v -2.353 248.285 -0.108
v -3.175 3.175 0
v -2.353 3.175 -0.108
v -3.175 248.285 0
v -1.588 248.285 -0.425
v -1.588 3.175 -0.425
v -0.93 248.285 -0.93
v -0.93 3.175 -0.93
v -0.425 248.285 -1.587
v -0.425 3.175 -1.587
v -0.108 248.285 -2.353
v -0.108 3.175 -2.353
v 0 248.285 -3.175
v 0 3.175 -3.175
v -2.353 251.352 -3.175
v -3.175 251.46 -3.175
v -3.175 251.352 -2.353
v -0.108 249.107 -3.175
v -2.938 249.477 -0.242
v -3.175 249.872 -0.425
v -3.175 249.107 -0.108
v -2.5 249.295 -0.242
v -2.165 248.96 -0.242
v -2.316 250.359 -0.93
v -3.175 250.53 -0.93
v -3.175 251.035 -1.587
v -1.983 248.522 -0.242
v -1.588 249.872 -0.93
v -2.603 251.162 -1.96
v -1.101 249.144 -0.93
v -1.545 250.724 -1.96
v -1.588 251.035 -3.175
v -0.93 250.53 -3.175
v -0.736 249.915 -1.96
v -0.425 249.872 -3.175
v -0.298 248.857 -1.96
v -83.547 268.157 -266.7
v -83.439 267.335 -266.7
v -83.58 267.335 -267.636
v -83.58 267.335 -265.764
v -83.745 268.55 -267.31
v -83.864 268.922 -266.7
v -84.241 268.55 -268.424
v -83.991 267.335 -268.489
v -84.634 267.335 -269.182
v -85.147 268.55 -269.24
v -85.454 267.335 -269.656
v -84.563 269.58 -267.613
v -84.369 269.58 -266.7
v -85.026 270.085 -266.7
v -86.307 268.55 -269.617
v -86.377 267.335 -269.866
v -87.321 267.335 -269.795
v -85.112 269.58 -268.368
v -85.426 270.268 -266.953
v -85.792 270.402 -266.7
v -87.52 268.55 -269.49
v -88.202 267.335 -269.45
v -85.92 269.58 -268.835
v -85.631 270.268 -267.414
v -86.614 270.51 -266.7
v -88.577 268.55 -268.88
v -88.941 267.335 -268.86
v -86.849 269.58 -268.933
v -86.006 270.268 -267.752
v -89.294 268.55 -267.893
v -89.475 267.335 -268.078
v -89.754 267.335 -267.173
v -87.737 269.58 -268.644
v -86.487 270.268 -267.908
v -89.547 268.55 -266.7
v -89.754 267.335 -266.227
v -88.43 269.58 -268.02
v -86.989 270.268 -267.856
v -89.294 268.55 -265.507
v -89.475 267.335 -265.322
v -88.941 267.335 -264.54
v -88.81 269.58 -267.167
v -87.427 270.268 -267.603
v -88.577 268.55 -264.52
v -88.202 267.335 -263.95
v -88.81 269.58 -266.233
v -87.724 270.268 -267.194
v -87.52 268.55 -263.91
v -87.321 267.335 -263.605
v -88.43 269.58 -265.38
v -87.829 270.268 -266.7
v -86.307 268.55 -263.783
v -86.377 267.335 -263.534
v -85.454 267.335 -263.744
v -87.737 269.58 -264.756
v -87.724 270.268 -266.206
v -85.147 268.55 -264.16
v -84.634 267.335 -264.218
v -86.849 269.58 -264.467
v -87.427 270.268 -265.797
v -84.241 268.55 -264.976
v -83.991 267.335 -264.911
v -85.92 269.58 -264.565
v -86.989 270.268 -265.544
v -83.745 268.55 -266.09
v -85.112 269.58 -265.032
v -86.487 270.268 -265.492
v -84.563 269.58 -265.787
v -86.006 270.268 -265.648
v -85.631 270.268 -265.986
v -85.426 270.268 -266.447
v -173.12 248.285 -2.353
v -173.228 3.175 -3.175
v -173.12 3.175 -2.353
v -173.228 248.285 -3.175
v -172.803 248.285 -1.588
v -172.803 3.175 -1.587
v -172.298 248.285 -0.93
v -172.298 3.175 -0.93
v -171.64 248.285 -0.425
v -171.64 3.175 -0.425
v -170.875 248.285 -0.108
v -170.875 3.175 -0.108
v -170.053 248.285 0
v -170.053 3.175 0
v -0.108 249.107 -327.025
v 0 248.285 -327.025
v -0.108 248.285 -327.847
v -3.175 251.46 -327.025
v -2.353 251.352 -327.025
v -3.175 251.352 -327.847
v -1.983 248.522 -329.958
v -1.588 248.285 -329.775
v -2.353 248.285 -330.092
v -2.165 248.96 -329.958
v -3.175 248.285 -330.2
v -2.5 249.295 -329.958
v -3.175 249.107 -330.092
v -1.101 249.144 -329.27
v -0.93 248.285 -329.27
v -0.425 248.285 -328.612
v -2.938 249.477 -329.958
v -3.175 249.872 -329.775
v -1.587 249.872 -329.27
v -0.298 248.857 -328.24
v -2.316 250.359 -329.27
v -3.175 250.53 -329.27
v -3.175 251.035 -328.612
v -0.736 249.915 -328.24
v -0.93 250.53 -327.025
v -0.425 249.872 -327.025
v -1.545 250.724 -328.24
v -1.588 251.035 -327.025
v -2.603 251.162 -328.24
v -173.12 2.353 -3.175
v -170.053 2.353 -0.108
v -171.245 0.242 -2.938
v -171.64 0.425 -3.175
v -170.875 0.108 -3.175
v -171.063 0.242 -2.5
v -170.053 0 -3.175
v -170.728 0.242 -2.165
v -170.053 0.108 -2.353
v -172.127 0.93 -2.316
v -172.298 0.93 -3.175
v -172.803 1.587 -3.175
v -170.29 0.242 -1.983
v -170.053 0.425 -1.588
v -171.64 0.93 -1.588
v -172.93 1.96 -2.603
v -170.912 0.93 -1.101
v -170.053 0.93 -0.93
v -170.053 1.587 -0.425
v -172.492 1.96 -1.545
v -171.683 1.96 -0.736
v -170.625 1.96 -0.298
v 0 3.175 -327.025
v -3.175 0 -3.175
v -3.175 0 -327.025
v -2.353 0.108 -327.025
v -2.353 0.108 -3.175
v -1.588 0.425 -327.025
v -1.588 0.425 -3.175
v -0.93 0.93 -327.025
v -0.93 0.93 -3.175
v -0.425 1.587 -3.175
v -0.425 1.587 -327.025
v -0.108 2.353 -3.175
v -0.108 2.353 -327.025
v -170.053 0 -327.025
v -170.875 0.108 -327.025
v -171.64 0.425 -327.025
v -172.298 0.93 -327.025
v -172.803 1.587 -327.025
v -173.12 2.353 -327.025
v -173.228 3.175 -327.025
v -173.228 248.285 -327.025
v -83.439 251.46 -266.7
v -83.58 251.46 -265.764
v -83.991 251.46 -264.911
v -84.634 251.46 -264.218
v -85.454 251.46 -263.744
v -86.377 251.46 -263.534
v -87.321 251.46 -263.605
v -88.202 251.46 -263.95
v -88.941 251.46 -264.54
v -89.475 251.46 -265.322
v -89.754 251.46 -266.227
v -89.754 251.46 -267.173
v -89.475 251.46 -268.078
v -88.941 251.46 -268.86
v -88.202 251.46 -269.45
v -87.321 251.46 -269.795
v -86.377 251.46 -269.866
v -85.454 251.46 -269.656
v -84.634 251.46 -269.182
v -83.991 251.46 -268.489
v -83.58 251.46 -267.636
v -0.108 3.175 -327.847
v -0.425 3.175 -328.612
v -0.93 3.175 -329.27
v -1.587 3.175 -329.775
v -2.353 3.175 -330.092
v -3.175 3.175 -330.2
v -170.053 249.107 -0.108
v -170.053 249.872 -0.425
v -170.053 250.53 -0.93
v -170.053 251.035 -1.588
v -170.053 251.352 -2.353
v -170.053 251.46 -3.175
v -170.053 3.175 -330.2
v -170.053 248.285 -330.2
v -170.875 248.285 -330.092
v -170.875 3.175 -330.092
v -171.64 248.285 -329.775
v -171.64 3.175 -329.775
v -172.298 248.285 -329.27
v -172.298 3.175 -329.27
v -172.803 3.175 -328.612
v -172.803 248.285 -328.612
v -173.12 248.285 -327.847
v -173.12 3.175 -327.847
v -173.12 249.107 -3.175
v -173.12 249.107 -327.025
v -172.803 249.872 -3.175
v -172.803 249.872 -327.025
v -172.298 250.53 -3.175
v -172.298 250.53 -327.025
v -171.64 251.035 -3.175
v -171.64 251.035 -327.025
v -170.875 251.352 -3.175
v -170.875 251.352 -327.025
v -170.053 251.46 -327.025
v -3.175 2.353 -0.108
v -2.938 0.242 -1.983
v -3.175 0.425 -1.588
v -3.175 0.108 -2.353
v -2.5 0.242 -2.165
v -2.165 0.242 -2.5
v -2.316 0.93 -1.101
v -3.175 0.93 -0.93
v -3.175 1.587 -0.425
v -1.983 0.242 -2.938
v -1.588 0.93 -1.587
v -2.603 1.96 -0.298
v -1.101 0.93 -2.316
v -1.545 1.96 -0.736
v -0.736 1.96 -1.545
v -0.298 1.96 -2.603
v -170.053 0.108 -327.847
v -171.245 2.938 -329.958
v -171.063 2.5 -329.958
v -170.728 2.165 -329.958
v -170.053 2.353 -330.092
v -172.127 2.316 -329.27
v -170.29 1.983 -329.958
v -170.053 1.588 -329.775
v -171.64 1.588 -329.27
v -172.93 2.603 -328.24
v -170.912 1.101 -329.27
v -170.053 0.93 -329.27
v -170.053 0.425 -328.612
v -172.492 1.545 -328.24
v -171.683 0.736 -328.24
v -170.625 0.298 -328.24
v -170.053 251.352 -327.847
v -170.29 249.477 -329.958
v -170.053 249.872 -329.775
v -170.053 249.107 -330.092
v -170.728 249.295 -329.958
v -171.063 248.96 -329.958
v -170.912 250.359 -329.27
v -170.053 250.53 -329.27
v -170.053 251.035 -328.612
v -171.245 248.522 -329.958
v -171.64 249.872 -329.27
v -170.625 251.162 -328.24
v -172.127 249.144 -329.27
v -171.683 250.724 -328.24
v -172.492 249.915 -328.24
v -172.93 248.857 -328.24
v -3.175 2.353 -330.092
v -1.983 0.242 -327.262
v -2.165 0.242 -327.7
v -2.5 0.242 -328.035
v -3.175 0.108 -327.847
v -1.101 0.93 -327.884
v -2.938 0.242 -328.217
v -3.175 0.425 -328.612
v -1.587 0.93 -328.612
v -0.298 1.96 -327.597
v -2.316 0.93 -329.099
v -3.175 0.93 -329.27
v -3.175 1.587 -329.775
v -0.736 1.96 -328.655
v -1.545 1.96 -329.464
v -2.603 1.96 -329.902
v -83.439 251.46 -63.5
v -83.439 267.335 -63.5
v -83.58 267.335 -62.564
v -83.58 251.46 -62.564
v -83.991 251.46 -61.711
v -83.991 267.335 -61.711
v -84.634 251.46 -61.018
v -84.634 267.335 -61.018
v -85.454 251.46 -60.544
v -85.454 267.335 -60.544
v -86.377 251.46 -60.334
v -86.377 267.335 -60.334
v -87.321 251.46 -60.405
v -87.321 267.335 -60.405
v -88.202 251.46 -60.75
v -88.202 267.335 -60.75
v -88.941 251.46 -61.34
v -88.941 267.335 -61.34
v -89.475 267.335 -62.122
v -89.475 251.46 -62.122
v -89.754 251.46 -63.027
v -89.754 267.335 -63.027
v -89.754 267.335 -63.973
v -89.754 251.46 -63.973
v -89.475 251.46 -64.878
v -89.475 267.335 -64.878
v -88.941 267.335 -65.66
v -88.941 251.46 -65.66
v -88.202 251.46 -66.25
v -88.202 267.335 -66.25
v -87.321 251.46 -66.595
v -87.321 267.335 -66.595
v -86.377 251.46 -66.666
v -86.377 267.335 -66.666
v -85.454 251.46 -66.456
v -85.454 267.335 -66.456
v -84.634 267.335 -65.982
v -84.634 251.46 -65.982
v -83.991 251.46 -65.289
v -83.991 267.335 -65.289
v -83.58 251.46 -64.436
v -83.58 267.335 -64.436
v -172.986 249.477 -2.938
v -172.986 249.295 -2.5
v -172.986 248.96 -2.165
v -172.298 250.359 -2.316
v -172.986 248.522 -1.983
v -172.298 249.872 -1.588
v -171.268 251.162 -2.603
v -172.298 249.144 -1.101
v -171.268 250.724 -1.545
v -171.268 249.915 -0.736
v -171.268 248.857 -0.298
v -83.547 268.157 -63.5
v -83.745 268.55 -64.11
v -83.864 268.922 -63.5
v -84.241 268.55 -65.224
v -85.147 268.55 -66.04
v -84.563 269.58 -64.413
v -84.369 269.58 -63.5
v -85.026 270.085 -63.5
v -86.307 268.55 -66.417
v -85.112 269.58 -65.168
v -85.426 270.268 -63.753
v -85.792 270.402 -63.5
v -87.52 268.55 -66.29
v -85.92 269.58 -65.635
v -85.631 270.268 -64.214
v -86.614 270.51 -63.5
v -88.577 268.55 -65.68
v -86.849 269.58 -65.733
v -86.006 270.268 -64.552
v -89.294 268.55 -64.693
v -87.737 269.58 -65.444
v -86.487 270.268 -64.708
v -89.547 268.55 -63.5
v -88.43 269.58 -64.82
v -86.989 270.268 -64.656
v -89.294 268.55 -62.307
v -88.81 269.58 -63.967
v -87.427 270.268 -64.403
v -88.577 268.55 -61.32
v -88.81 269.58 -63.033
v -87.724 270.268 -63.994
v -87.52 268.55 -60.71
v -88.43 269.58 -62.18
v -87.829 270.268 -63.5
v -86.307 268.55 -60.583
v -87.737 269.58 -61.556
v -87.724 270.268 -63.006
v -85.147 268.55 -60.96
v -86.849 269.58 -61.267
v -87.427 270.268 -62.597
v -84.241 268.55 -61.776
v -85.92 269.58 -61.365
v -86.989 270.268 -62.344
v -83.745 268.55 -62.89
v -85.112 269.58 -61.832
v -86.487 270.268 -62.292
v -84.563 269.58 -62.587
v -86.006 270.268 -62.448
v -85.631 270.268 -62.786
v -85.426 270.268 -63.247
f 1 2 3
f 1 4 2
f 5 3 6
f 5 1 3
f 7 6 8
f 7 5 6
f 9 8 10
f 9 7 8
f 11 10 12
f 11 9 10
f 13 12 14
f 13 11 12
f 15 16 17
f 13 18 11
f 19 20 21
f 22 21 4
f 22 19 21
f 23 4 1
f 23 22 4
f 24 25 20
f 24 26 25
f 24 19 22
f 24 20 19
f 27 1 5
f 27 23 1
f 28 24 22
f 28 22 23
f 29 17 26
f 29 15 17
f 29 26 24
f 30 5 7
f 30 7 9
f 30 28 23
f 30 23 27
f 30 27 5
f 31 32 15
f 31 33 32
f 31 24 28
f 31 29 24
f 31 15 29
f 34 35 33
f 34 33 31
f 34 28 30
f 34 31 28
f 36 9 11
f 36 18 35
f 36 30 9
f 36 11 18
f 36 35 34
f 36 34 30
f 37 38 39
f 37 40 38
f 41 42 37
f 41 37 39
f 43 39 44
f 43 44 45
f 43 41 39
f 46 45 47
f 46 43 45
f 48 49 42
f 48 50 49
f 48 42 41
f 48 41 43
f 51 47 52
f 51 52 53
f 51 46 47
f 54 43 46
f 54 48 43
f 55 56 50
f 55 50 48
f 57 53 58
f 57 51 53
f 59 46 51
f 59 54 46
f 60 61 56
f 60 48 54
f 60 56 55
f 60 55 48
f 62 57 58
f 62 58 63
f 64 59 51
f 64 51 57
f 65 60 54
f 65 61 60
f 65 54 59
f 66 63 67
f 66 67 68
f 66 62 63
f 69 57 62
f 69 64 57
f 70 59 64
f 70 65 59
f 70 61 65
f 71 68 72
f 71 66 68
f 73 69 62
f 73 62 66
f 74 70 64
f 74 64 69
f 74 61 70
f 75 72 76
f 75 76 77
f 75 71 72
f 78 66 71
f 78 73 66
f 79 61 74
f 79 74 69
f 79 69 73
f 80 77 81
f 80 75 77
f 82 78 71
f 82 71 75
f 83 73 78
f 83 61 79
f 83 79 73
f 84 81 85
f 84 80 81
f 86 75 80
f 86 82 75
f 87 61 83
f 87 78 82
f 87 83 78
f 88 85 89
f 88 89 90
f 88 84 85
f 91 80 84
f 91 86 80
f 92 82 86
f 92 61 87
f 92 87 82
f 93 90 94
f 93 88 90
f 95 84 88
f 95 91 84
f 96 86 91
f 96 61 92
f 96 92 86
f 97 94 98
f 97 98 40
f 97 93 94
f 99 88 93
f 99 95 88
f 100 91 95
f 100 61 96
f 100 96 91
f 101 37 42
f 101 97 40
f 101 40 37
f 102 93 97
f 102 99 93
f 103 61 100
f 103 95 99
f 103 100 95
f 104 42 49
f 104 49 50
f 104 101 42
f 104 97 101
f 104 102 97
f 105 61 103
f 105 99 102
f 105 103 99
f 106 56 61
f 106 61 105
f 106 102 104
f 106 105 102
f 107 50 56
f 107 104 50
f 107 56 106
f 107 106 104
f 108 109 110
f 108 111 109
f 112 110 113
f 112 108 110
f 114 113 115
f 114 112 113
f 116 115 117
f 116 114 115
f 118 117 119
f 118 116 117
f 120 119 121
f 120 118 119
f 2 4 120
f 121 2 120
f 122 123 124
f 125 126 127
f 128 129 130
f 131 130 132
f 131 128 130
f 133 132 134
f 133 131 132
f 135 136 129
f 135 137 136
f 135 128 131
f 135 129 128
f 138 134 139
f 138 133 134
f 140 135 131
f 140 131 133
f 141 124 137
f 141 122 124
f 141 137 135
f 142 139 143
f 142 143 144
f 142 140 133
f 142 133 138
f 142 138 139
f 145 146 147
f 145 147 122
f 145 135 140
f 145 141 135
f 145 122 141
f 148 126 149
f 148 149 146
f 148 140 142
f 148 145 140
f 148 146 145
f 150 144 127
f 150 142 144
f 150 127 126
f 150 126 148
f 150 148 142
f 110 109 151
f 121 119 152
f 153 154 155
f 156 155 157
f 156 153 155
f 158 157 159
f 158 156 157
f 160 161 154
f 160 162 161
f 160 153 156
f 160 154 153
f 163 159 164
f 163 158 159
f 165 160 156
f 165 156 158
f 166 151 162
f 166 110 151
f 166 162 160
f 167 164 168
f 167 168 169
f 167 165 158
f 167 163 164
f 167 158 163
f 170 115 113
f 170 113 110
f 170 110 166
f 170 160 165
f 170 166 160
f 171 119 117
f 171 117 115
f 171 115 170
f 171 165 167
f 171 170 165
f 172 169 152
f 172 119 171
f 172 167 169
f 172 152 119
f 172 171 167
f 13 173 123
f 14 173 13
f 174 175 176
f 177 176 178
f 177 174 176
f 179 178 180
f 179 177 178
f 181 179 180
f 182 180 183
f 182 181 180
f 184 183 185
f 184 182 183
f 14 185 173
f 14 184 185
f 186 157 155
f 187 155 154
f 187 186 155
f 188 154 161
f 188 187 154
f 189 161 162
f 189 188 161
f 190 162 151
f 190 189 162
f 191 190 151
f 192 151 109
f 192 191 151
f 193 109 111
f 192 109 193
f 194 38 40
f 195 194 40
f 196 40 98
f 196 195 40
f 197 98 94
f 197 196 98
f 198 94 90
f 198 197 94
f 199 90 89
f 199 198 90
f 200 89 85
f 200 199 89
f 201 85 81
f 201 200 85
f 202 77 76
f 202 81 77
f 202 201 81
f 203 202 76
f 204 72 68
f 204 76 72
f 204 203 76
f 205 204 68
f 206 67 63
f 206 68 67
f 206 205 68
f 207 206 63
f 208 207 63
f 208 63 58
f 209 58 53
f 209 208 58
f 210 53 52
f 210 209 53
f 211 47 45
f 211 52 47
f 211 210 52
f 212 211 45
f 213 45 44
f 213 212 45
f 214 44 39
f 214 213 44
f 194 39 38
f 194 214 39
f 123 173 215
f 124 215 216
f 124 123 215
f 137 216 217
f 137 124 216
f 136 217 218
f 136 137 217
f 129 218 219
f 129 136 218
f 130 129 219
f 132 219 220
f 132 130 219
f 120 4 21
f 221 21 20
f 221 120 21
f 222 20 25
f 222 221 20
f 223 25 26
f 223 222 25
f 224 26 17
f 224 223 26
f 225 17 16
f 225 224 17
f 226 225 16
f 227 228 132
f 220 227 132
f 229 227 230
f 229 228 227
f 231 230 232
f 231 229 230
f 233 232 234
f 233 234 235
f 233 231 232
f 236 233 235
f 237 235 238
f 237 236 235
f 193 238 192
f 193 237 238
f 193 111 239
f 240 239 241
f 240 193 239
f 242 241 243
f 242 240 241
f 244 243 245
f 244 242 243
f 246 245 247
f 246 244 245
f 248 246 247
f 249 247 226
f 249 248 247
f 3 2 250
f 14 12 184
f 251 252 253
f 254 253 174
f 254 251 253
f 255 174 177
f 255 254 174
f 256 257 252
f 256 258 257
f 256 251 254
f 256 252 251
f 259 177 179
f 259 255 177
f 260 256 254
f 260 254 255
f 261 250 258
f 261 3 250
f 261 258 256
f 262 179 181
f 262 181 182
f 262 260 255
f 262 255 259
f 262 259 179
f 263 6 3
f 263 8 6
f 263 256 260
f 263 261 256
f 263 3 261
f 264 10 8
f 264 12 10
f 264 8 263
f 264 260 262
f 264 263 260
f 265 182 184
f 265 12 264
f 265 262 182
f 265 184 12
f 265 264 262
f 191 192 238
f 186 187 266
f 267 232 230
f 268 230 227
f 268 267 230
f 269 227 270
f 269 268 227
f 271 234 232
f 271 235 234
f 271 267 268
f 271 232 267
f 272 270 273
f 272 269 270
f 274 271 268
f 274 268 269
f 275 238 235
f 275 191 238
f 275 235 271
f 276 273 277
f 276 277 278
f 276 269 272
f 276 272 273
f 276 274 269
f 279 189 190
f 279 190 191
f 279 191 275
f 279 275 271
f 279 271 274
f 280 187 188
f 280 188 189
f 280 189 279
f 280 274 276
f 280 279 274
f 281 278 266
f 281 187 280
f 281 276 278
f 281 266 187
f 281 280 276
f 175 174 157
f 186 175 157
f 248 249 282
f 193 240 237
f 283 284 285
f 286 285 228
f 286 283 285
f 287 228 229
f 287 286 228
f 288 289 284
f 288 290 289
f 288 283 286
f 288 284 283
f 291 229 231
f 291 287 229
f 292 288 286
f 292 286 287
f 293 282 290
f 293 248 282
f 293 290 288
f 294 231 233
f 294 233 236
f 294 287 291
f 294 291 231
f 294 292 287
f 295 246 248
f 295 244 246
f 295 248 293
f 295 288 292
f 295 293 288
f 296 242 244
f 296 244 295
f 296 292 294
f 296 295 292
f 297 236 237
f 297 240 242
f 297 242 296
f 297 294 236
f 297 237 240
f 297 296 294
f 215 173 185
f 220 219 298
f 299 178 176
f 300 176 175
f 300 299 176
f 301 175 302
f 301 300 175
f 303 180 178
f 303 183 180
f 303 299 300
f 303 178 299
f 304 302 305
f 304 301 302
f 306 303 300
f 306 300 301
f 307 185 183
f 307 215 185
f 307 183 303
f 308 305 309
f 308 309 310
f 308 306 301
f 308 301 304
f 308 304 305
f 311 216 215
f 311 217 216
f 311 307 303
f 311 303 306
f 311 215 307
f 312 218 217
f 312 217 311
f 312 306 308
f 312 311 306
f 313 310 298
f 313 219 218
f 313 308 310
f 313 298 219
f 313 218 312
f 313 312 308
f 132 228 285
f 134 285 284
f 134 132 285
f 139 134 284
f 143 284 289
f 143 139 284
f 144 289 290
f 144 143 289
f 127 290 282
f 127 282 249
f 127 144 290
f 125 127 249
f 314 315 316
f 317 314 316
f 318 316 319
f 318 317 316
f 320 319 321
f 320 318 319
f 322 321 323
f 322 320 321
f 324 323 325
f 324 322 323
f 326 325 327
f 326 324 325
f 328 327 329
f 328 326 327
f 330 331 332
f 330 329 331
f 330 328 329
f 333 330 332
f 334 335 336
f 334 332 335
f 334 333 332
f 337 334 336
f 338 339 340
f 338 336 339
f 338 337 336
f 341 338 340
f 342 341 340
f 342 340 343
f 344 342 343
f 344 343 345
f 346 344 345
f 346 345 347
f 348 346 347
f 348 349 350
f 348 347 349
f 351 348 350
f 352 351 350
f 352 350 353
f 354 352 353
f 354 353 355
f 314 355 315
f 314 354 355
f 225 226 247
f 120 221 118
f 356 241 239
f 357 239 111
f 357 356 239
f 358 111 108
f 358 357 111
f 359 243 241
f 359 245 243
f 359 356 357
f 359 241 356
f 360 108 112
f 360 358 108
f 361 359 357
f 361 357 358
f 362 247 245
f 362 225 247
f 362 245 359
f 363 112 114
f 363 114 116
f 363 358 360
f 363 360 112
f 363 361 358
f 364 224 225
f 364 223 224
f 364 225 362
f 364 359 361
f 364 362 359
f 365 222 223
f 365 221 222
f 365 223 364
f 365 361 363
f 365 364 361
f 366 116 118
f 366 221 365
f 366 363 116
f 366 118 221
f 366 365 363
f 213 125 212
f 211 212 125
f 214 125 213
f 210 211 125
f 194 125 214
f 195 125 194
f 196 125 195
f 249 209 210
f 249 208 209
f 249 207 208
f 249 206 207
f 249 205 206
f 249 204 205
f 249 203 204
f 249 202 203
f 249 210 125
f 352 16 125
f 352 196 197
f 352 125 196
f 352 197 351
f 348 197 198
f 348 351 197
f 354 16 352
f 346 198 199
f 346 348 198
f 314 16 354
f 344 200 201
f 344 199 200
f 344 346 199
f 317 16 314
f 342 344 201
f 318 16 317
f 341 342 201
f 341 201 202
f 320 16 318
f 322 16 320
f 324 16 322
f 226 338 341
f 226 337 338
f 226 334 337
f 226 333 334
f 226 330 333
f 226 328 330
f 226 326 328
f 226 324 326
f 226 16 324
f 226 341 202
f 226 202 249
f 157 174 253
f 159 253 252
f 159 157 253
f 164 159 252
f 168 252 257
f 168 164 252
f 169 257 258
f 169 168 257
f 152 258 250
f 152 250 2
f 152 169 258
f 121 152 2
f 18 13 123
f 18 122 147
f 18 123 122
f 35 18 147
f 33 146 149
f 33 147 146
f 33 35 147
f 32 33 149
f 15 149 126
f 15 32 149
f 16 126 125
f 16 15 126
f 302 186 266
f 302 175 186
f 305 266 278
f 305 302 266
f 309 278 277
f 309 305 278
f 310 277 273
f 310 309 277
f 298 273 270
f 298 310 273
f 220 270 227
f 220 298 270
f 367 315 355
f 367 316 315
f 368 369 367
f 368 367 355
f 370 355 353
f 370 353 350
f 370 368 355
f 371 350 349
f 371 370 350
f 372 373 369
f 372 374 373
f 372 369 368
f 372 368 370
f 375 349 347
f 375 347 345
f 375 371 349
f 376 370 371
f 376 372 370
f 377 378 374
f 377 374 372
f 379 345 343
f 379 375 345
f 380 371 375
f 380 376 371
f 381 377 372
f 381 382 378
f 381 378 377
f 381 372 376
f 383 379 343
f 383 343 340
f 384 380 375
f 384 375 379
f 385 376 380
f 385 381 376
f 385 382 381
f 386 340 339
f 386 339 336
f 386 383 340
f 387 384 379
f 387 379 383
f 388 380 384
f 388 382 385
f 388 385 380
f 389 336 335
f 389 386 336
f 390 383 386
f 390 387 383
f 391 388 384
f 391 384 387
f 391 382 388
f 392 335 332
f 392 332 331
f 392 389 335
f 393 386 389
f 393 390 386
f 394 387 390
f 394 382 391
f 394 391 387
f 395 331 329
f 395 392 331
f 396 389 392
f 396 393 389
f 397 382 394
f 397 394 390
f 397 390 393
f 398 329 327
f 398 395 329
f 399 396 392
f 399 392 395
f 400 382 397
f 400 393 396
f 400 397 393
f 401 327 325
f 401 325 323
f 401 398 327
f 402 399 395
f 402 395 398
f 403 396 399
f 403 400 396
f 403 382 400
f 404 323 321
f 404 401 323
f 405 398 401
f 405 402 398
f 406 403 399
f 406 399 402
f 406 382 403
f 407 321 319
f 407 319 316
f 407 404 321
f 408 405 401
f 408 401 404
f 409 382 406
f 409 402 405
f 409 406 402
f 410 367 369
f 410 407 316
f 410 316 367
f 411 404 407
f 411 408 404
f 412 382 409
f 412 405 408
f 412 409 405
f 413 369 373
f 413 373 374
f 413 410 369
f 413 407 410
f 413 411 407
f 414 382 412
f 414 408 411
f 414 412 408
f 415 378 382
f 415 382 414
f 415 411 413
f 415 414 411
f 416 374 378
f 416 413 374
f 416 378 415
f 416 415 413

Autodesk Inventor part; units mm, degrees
ref_plane "YZ Plane" through (0, 0, 0) normal (1, 0, 0) x (0, 1, 0)
ref_plane "XZ Plane" through (0, 0, 0) normal (0, 1, 0) x (-1, 0, 0)
ref_plane "XY Plane" through (0, 0, 0) normal (0, 0, 1) x (1, 0, 0)
sketch "Sketch1" plane through (0, 0, 0) normal (0, 1, 0) x (-1, 0, 0)
  line L0 (0, 0) -> (173.228, 0)
  line L1 (173.228, 0) -> (173.228, -330.2)
  line L2 (173.228, -330.2) -> (0, -330.2)
  line L3 (0, -330.2) -> (0, 0)
  dimension "d0" = 173.228
  dimension "d1" = 330.2
extrude "Extrusion1" add sketch "Sketch1" along normal blind 251.46
fillet "Fillet1" radius 3.175 12 edges at (0, 251.46, -165.1) (-86.614, 251.46, 0) (0, 125.73, 0) (-173.228, 251.46, -165.1) (-86.614, 251.46, -330.2) (0, 125.73, -330.2) (-173.228, 125.73, 0) (-86.614, 0, 0) (0, 0, -165.1) (-173.228, 0, -165.1) (-86.614, 0, -330.2) (-173.228, 125.73, -330.2)
sketch "Sketch2" plane through (0, 251.46, 0) normal (0, 1, 0) x (1, 0, 0)
  circle A0 centre (-86.614, 63.5) radius 3.175
  circle A1 centre (-86.614, 266.7) radius 3.175
  line L0 (0, 3.175) -> (0, 327.025) projected
  line L1 (-173.228, 327.025) -> (-173.228, 3.175) projected
  line L2 (-3.175, 330.2) -> (-170.053, 330.2) projected
  line L3 (-170.053, 0) -> (-3.175, 0) projected
  point P0 (0, 0)
  dimension "d5" = 6.35
  dimension "d6" = 6.35
  dimension "d9" = 86.614
  dimension "d10" = 86.614
  dimension "d11" = 86.614
  dimension "d12" = 63.5
  dimension "d13" = 63.5
extrude "Extrusion2" add sketch "Sketch2" along normal blind 19.05
fillet "Fillet2" radius 3.175 2 edges at (-89.789, 270.51, -63.5) (-89.789, 270.51, -266.7)
equation "\"d10\" = d11"
properties part number "Deep Cycle Battery"
